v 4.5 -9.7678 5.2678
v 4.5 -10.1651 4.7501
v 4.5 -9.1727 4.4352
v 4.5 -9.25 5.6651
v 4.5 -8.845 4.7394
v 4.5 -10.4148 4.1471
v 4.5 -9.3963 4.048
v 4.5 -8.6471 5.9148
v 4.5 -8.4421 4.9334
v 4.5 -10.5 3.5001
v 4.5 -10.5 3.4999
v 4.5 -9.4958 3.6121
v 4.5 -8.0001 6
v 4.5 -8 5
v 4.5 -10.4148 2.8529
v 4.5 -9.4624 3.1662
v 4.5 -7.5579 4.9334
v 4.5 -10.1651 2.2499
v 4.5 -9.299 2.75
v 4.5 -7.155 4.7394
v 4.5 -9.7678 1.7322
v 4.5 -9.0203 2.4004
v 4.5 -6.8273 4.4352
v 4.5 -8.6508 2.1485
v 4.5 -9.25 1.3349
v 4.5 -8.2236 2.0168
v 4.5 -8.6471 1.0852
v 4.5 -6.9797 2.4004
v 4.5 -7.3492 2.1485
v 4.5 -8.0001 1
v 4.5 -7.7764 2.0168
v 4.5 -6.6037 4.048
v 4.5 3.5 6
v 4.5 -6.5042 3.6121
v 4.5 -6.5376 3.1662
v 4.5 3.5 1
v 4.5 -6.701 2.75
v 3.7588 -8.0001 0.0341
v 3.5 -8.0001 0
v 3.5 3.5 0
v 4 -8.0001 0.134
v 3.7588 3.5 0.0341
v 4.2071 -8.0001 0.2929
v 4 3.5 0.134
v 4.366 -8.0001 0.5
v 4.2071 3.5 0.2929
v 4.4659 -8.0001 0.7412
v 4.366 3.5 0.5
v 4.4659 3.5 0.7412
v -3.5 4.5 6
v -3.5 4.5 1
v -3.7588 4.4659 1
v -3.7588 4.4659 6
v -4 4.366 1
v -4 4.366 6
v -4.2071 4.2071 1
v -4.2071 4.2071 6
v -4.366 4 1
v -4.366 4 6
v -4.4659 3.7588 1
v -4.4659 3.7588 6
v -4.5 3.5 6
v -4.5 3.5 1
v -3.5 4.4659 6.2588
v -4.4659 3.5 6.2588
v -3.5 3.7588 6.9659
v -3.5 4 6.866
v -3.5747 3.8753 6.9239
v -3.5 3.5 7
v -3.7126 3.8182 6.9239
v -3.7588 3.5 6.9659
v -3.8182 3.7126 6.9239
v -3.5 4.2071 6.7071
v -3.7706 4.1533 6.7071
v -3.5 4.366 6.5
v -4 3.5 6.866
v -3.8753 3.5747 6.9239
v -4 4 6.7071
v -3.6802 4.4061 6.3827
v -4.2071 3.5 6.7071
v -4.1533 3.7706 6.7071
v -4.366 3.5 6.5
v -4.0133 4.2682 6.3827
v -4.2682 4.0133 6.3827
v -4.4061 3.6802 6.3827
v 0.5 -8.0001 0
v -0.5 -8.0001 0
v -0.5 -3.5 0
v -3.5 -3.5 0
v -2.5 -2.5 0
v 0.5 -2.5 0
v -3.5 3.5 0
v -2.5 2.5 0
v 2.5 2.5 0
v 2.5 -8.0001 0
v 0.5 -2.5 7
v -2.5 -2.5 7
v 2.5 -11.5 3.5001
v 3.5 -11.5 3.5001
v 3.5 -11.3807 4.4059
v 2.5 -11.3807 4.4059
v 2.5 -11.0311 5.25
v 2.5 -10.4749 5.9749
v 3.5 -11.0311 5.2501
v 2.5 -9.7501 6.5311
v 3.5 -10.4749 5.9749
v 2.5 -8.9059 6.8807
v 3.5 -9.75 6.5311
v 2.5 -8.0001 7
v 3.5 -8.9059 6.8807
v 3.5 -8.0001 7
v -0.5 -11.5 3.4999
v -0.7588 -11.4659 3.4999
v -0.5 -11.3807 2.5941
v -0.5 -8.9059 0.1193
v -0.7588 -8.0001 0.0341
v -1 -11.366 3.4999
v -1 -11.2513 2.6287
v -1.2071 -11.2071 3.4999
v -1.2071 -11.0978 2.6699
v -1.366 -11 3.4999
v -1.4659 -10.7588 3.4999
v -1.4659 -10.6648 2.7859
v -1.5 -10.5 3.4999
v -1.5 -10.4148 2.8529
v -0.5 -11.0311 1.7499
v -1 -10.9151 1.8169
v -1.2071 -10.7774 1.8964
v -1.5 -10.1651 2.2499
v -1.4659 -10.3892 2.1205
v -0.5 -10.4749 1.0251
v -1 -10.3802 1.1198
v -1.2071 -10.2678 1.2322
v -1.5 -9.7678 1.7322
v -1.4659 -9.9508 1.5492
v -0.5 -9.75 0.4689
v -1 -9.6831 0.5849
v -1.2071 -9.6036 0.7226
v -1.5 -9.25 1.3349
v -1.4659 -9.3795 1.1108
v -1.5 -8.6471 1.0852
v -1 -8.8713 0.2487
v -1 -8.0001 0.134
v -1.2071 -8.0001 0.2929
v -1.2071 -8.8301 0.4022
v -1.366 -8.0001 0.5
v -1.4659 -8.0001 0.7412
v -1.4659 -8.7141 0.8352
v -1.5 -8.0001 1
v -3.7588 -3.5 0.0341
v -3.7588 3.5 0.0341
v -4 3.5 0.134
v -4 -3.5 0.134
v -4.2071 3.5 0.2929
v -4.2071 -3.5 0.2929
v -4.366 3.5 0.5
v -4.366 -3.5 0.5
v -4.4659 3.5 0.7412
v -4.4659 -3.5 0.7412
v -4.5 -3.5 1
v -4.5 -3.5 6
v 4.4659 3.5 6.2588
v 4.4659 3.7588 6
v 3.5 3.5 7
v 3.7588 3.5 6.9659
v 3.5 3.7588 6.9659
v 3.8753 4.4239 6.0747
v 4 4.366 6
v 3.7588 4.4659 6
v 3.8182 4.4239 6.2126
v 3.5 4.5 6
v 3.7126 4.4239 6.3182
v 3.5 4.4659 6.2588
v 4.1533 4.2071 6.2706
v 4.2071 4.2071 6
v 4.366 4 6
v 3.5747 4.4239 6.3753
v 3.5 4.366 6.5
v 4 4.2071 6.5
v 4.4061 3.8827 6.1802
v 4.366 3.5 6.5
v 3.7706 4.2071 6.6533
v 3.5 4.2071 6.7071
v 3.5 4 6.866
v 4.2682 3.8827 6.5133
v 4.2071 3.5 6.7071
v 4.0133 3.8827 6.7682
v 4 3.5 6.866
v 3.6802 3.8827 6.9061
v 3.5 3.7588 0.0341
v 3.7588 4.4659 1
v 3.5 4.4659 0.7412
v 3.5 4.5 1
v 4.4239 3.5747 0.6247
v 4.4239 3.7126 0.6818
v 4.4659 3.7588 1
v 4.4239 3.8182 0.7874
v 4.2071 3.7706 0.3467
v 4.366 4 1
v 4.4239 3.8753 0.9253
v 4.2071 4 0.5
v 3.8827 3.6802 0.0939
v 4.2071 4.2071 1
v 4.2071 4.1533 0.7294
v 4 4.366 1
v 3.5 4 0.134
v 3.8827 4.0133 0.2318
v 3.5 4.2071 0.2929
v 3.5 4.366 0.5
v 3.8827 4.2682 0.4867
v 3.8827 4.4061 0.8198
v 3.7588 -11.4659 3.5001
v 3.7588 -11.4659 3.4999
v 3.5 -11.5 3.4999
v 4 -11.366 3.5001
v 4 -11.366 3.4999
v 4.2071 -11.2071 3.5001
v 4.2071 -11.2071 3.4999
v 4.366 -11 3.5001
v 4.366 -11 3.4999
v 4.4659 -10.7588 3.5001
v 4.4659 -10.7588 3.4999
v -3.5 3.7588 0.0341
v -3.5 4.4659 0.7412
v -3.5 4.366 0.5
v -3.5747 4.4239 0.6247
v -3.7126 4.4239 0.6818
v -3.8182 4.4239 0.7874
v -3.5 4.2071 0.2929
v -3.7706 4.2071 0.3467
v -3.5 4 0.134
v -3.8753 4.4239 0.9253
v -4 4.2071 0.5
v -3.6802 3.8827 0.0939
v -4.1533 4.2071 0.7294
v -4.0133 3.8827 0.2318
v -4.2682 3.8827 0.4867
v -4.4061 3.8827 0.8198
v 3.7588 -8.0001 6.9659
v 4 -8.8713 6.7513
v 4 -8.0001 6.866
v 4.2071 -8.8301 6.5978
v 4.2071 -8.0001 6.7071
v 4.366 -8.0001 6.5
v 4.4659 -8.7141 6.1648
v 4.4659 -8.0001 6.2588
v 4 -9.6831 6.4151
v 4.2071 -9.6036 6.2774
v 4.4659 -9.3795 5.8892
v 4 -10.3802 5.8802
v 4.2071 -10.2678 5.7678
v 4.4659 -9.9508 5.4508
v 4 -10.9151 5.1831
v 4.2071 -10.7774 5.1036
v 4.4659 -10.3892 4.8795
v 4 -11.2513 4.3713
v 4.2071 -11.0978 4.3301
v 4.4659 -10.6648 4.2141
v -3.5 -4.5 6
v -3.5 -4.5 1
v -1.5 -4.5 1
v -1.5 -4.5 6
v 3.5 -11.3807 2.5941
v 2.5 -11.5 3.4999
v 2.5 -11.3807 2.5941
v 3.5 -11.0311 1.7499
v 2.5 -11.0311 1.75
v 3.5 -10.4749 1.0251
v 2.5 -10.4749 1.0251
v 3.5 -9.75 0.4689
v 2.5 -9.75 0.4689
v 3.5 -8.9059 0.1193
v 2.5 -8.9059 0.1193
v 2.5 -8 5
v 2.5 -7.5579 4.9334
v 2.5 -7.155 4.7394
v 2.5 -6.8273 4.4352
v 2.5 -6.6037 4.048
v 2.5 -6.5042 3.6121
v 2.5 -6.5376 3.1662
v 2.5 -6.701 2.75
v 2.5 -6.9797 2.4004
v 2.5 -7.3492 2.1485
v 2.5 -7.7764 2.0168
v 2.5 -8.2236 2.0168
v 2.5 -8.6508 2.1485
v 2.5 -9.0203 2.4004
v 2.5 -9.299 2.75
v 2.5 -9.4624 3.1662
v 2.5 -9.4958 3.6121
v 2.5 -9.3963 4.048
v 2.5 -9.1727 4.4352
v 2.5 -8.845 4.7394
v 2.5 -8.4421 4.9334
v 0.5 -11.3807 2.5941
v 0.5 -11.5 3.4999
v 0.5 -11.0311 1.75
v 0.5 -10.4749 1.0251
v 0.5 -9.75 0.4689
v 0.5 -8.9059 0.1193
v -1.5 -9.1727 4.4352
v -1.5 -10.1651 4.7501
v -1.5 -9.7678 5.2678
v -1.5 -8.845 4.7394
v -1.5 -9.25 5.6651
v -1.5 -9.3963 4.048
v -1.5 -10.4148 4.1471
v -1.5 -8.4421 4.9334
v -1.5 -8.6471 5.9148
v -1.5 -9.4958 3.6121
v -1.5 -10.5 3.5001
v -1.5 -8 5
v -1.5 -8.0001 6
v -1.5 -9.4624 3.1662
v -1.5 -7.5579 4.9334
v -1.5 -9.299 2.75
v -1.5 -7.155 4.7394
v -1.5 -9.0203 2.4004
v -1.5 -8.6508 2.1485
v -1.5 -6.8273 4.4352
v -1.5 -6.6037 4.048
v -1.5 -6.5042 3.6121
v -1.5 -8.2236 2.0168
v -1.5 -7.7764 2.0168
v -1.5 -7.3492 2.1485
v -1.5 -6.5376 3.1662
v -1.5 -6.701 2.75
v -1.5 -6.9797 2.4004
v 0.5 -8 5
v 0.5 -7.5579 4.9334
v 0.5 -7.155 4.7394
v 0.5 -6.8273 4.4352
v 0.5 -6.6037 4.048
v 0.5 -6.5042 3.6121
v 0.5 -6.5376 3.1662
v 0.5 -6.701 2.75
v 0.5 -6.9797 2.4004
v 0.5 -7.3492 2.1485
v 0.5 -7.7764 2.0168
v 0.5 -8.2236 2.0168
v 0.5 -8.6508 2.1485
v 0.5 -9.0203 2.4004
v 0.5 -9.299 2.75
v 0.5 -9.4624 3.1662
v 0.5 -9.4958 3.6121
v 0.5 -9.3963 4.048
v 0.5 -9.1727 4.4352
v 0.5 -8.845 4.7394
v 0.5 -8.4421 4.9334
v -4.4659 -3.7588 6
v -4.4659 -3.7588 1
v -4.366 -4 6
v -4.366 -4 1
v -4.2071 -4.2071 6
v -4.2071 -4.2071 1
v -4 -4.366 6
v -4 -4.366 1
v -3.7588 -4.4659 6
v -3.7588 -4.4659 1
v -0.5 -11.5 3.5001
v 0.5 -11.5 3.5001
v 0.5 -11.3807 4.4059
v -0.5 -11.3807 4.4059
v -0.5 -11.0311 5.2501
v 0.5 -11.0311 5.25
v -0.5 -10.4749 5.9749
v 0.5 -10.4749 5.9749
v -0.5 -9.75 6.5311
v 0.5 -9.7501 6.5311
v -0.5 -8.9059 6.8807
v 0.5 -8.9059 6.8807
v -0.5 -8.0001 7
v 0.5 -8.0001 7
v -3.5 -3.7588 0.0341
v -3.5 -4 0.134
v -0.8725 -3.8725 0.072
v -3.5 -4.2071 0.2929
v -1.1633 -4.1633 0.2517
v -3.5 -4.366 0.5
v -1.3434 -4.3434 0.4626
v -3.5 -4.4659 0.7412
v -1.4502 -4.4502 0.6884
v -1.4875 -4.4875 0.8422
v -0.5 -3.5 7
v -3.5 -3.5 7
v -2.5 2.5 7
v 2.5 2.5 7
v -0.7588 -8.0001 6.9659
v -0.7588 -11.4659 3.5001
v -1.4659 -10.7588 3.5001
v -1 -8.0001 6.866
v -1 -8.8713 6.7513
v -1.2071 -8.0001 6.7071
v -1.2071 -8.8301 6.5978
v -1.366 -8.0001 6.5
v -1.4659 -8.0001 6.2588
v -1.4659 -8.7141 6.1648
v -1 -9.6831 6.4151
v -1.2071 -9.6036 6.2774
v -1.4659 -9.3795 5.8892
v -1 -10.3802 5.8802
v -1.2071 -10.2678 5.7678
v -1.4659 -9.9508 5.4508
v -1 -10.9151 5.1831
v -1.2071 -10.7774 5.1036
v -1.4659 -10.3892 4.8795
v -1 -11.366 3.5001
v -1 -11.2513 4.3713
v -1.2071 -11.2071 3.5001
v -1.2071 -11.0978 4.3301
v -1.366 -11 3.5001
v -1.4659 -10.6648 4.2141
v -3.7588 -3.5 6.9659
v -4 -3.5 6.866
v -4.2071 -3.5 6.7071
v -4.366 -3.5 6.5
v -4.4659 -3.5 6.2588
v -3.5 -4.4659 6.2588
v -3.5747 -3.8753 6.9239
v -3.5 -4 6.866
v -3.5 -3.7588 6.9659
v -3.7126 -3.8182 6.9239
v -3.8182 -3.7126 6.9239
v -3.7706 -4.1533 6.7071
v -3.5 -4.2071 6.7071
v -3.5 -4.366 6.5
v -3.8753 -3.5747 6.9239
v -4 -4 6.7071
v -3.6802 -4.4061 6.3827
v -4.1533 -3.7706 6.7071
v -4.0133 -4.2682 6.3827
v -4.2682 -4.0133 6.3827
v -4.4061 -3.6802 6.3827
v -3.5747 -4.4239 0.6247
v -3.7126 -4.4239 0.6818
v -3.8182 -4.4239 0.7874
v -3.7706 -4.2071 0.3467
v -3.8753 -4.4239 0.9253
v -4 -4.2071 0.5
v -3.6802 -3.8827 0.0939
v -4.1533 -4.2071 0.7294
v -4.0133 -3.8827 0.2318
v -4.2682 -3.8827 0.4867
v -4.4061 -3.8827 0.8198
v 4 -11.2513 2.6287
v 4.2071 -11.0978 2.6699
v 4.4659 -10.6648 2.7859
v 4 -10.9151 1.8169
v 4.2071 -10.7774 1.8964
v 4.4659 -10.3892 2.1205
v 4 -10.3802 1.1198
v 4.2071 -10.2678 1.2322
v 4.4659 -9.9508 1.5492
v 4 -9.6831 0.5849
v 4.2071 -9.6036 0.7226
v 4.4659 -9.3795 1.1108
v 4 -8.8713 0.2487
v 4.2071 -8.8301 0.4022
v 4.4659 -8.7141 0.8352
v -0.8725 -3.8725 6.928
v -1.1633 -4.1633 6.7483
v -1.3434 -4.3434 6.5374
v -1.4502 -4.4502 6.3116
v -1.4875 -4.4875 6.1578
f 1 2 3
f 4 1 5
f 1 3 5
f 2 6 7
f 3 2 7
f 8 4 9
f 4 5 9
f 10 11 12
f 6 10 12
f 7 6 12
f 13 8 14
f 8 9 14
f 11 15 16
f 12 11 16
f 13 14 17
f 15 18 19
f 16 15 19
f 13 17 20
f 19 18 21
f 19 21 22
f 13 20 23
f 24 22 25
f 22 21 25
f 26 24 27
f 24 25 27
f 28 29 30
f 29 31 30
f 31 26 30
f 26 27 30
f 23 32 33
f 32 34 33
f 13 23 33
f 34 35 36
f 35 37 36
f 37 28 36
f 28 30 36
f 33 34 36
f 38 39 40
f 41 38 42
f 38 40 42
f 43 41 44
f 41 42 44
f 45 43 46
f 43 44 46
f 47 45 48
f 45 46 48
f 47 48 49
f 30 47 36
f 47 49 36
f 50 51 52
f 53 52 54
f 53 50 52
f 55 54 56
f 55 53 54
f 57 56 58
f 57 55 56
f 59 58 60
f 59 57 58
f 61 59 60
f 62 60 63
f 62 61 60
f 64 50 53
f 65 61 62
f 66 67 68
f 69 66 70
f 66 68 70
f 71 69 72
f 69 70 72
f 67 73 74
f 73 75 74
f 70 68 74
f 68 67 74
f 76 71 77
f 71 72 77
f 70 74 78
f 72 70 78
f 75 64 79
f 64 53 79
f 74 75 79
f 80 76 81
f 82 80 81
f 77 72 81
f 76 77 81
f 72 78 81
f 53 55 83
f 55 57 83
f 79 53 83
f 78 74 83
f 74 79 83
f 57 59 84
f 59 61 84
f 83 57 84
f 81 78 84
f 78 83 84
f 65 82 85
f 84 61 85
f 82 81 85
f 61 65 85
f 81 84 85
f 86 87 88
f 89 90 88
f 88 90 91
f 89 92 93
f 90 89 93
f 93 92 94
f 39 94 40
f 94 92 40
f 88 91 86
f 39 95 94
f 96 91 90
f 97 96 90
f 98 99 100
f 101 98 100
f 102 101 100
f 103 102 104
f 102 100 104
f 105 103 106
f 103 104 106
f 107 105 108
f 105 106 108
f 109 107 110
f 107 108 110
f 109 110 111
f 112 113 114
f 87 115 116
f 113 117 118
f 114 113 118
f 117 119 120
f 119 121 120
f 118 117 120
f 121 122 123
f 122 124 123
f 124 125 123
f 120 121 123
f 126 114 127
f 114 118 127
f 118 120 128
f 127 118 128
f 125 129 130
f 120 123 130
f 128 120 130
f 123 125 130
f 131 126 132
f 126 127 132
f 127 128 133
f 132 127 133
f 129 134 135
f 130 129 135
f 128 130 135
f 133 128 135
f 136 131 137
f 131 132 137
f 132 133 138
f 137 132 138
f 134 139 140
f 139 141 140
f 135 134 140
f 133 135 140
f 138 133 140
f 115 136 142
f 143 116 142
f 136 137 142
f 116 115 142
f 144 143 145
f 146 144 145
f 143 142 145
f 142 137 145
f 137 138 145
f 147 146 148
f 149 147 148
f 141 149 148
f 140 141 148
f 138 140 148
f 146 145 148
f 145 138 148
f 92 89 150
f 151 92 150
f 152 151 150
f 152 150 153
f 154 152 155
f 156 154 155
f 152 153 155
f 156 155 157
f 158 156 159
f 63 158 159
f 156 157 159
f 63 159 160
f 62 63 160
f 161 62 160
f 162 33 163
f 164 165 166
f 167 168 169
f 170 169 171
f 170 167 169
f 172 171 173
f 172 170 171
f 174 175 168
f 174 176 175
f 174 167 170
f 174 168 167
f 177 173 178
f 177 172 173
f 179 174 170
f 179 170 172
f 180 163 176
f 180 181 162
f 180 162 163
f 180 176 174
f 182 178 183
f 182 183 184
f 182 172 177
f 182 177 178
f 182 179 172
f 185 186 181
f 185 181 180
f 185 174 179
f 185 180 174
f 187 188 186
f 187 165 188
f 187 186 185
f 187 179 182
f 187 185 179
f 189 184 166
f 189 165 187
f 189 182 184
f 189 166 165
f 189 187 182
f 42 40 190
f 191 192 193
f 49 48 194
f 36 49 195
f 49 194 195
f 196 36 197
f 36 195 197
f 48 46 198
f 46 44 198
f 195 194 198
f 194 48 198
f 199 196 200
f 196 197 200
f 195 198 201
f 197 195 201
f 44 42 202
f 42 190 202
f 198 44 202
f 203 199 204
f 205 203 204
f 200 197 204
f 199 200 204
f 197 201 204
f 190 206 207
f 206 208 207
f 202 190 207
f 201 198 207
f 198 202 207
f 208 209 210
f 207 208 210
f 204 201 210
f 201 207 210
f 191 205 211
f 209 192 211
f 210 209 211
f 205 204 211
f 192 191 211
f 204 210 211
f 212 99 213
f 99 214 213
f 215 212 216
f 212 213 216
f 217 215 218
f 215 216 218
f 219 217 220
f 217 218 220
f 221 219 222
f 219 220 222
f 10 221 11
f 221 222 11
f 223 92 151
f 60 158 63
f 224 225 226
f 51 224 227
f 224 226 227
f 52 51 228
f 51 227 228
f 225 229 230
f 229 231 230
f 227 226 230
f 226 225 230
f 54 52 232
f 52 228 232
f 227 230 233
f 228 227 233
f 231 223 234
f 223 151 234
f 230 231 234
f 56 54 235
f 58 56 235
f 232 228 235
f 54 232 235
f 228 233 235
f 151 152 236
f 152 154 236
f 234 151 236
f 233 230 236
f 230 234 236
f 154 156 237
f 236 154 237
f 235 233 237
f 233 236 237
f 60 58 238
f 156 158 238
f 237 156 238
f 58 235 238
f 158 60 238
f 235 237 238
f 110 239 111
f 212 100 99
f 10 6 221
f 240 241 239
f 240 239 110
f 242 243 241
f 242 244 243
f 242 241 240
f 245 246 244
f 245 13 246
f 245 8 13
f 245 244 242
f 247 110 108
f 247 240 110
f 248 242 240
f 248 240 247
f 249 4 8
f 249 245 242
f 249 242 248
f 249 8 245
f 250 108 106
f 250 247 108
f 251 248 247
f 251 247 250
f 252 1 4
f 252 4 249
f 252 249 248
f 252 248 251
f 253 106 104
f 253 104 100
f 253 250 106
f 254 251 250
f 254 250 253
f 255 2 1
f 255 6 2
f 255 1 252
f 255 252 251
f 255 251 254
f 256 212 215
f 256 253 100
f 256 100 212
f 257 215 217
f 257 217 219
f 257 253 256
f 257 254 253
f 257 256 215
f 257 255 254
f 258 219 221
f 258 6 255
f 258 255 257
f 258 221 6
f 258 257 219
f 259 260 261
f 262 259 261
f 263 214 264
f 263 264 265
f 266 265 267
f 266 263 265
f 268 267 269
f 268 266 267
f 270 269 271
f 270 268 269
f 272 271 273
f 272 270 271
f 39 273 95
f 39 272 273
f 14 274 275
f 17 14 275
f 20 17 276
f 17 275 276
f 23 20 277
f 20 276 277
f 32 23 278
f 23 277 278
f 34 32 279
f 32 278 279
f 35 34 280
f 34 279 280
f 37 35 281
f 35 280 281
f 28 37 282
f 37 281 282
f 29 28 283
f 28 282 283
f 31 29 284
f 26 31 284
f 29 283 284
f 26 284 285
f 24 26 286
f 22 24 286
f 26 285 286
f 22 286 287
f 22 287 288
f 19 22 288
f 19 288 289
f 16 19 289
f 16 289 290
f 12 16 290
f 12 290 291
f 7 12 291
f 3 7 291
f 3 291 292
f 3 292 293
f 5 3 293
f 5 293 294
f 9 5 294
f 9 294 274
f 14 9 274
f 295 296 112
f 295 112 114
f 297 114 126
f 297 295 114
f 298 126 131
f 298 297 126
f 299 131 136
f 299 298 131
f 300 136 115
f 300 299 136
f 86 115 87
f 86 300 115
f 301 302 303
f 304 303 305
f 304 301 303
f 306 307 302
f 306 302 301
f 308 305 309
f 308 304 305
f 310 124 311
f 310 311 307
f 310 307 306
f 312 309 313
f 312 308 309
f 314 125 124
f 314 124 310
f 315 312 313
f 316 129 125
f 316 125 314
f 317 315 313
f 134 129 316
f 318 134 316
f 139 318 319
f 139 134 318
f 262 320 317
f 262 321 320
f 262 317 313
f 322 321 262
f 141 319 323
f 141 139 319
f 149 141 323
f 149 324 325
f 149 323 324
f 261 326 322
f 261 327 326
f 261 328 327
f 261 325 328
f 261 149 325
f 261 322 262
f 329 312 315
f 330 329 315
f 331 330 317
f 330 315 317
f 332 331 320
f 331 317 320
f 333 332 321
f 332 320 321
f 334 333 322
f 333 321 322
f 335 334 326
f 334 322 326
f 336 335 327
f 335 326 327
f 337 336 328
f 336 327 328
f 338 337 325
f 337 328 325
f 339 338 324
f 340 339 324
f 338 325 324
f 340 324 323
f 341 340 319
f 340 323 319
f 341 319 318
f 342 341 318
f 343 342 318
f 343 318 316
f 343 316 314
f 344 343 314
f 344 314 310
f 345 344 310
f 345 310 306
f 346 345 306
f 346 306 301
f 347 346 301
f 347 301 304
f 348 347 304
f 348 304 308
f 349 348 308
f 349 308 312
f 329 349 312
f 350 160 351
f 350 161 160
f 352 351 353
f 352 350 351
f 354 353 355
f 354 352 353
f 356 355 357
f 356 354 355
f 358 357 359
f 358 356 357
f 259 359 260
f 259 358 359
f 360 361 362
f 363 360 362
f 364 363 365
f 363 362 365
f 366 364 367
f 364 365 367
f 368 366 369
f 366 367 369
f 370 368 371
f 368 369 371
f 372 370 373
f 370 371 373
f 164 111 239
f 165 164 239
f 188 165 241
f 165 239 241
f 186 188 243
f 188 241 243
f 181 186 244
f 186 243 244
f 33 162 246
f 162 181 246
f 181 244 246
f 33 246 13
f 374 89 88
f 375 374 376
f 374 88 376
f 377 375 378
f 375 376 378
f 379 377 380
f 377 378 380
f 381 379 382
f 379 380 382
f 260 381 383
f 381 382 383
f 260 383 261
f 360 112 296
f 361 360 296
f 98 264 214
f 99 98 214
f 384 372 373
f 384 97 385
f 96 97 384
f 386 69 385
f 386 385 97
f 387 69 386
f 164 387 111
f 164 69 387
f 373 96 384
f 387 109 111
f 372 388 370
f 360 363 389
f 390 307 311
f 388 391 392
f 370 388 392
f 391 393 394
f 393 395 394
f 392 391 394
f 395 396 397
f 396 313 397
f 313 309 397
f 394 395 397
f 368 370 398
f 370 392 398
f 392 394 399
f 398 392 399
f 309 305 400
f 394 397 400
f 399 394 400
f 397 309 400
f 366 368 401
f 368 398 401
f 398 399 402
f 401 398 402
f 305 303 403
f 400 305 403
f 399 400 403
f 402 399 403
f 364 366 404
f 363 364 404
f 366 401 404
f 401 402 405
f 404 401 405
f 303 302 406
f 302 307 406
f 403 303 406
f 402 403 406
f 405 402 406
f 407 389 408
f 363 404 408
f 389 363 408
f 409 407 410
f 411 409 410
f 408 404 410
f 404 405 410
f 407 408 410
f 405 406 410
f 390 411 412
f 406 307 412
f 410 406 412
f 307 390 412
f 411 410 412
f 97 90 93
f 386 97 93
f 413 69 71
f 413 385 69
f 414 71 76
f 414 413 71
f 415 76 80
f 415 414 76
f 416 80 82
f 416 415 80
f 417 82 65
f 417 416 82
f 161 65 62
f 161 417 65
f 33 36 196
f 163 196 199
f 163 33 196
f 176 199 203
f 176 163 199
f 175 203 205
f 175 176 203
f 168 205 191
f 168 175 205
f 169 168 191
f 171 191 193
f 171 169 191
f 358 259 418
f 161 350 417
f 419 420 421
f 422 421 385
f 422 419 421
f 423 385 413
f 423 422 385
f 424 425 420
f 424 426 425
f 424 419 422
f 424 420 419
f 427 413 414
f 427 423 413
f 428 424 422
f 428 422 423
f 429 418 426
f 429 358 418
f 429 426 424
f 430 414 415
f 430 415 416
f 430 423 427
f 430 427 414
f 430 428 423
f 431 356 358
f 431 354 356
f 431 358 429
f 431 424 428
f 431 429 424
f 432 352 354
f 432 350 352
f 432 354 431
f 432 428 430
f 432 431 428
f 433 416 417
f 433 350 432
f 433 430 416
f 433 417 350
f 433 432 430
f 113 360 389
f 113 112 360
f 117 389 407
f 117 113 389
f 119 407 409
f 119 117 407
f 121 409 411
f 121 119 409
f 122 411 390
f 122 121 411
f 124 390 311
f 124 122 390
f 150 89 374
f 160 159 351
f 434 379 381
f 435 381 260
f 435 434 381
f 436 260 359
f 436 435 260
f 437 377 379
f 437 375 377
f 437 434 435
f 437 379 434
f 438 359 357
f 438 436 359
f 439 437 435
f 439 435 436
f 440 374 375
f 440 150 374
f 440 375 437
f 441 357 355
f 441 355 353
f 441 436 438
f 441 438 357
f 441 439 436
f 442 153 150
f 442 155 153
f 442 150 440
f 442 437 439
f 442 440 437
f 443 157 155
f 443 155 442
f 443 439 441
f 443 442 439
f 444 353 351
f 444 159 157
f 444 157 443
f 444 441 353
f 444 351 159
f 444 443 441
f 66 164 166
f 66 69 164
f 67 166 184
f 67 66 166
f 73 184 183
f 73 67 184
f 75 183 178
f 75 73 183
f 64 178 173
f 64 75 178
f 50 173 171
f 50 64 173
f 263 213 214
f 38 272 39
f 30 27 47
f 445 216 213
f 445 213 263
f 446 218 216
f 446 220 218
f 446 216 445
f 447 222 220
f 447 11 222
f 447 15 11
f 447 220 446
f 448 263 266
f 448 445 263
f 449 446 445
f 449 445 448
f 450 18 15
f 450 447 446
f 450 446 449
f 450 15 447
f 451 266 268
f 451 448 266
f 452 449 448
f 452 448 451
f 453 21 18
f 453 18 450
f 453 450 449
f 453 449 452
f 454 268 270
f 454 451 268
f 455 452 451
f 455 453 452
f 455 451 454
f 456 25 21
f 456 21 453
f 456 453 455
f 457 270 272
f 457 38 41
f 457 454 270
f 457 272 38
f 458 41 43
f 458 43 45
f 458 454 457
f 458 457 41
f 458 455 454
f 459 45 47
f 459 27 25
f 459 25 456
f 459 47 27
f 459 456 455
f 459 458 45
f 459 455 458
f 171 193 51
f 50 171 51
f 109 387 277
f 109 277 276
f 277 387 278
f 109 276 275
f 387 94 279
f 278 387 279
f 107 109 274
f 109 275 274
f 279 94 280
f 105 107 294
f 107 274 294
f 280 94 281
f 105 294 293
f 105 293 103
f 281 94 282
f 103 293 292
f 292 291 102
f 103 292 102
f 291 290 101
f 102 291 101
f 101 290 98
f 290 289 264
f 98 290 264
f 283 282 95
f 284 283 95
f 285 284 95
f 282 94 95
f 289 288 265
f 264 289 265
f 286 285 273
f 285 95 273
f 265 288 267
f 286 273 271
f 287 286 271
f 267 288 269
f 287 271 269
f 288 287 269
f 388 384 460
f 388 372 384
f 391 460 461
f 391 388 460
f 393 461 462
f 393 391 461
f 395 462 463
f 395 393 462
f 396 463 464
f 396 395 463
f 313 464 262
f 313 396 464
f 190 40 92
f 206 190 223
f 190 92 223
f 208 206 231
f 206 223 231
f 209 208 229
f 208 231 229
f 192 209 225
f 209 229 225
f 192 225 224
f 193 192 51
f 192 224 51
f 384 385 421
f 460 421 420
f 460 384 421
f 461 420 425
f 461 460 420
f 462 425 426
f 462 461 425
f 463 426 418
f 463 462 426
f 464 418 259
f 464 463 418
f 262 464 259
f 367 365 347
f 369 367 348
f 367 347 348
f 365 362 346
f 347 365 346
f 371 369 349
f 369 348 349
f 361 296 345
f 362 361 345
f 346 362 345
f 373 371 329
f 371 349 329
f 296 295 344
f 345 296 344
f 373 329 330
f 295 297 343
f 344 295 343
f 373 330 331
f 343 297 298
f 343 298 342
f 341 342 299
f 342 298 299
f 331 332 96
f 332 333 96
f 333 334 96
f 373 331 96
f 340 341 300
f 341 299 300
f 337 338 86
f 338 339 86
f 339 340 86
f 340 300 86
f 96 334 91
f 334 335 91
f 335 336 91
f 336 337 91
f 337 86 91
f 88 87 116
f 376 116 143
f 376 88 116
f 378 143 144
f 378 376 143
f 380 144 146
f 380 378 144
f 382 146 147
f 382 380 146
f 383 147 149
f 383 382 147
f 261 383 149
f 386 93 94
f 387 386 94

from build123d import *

# Parameters (mm, degrees)
SKETCH_1_W          = 2
SKETCH_1_H          = 7
EXTRUDE_2_DEPTH     = 7
FILLET_4_R          = 3.5
SKETCH_3_R          = 1.5
CUT_EXTRUDE_2_DEPTH = 15.739402973
FILLET_5_R          = 1


with BuildPart() as part:
    # 草图1 → 凸台-拉伸2 (new body)
    with BuildSketch(Plane.XY):
        Polygon((-2.5, -2.5), (-2.5, 2.5), (2.5, 2.5), (2.5, -2.5), (2.5, -4.5), (4.5, -4.5), (4.5, 4.5), (-4.5, 4.5), (-4.5, -4.5), (-1.5, -4.5), (0.5, -4.5), (0.5, -2.5), align=None)
        with Locations((-0.5, -8)):
            Rectangle(SKETCH_1_W, SKETCH_1_H)
        with Locations((3.5, -8)):
            Rectangle(SKETCH_1_W, SKETCH_1_H)
    extrude(amount=EXTRUDE_2_DEPTH)

    # 圆角4
    fillet_4_edges = [part.edges().sort_by_distance(p)[0] for p in [
        (3.5, -11.5, 0),
        (3.5, -11.5, 7),
        (-0.5, -11.5, 0),
        (-0.5, -11.5, 7),
    ]]
    fillet(fillet_4_edges, radius=FILLET_4_R - 0.0001)  # a hair under: the kernel refuses the full size

    # 草图3 → 切除-拉伸2 (cut, through all)
    with BuildSketch(Plane.ZY.offset(1.5)):
        with Locations((3.5, -8)):
            Circle(SKETCH_3_R)
    extrude(amount=-CUT_EXTRUDE_2_DEPTH, mode=Mode.SUBTRACT)

    # 圆角5
    fillet_5_edges = [part.edges().sort_by_distance(p)[0] for p in [
        (-4.5, 0, 0),
        (0, 4.5, 0),
        (4.5, -1.75005, 0),
        (-3, -4.5, 0),
        (-4.5, -4.5, 3.5),
        (-4.5, 4.5, 3.5),
        (4.5, 4.5, 3.5),
        (-3, -4.5, 7),
        (-1.5, -6.25005, 0),
        (4.5, -1.75005, 7),
        (4.5, -10.474903023, 5.974903023),
        (4.5, -10.474903023, 1.025096977),
        (-1.5, -6.25005, 7),
        (-1.5, -10.474903023, 5.974903023),
        (-1.5, -10.474903023, 1.025096977),
        (0, 4.5, 7),
        (-4.5, 0, 7),
    ]]
    fillet(fillet_5_edges, radius=FILLET_5_R)


solid = part.part
